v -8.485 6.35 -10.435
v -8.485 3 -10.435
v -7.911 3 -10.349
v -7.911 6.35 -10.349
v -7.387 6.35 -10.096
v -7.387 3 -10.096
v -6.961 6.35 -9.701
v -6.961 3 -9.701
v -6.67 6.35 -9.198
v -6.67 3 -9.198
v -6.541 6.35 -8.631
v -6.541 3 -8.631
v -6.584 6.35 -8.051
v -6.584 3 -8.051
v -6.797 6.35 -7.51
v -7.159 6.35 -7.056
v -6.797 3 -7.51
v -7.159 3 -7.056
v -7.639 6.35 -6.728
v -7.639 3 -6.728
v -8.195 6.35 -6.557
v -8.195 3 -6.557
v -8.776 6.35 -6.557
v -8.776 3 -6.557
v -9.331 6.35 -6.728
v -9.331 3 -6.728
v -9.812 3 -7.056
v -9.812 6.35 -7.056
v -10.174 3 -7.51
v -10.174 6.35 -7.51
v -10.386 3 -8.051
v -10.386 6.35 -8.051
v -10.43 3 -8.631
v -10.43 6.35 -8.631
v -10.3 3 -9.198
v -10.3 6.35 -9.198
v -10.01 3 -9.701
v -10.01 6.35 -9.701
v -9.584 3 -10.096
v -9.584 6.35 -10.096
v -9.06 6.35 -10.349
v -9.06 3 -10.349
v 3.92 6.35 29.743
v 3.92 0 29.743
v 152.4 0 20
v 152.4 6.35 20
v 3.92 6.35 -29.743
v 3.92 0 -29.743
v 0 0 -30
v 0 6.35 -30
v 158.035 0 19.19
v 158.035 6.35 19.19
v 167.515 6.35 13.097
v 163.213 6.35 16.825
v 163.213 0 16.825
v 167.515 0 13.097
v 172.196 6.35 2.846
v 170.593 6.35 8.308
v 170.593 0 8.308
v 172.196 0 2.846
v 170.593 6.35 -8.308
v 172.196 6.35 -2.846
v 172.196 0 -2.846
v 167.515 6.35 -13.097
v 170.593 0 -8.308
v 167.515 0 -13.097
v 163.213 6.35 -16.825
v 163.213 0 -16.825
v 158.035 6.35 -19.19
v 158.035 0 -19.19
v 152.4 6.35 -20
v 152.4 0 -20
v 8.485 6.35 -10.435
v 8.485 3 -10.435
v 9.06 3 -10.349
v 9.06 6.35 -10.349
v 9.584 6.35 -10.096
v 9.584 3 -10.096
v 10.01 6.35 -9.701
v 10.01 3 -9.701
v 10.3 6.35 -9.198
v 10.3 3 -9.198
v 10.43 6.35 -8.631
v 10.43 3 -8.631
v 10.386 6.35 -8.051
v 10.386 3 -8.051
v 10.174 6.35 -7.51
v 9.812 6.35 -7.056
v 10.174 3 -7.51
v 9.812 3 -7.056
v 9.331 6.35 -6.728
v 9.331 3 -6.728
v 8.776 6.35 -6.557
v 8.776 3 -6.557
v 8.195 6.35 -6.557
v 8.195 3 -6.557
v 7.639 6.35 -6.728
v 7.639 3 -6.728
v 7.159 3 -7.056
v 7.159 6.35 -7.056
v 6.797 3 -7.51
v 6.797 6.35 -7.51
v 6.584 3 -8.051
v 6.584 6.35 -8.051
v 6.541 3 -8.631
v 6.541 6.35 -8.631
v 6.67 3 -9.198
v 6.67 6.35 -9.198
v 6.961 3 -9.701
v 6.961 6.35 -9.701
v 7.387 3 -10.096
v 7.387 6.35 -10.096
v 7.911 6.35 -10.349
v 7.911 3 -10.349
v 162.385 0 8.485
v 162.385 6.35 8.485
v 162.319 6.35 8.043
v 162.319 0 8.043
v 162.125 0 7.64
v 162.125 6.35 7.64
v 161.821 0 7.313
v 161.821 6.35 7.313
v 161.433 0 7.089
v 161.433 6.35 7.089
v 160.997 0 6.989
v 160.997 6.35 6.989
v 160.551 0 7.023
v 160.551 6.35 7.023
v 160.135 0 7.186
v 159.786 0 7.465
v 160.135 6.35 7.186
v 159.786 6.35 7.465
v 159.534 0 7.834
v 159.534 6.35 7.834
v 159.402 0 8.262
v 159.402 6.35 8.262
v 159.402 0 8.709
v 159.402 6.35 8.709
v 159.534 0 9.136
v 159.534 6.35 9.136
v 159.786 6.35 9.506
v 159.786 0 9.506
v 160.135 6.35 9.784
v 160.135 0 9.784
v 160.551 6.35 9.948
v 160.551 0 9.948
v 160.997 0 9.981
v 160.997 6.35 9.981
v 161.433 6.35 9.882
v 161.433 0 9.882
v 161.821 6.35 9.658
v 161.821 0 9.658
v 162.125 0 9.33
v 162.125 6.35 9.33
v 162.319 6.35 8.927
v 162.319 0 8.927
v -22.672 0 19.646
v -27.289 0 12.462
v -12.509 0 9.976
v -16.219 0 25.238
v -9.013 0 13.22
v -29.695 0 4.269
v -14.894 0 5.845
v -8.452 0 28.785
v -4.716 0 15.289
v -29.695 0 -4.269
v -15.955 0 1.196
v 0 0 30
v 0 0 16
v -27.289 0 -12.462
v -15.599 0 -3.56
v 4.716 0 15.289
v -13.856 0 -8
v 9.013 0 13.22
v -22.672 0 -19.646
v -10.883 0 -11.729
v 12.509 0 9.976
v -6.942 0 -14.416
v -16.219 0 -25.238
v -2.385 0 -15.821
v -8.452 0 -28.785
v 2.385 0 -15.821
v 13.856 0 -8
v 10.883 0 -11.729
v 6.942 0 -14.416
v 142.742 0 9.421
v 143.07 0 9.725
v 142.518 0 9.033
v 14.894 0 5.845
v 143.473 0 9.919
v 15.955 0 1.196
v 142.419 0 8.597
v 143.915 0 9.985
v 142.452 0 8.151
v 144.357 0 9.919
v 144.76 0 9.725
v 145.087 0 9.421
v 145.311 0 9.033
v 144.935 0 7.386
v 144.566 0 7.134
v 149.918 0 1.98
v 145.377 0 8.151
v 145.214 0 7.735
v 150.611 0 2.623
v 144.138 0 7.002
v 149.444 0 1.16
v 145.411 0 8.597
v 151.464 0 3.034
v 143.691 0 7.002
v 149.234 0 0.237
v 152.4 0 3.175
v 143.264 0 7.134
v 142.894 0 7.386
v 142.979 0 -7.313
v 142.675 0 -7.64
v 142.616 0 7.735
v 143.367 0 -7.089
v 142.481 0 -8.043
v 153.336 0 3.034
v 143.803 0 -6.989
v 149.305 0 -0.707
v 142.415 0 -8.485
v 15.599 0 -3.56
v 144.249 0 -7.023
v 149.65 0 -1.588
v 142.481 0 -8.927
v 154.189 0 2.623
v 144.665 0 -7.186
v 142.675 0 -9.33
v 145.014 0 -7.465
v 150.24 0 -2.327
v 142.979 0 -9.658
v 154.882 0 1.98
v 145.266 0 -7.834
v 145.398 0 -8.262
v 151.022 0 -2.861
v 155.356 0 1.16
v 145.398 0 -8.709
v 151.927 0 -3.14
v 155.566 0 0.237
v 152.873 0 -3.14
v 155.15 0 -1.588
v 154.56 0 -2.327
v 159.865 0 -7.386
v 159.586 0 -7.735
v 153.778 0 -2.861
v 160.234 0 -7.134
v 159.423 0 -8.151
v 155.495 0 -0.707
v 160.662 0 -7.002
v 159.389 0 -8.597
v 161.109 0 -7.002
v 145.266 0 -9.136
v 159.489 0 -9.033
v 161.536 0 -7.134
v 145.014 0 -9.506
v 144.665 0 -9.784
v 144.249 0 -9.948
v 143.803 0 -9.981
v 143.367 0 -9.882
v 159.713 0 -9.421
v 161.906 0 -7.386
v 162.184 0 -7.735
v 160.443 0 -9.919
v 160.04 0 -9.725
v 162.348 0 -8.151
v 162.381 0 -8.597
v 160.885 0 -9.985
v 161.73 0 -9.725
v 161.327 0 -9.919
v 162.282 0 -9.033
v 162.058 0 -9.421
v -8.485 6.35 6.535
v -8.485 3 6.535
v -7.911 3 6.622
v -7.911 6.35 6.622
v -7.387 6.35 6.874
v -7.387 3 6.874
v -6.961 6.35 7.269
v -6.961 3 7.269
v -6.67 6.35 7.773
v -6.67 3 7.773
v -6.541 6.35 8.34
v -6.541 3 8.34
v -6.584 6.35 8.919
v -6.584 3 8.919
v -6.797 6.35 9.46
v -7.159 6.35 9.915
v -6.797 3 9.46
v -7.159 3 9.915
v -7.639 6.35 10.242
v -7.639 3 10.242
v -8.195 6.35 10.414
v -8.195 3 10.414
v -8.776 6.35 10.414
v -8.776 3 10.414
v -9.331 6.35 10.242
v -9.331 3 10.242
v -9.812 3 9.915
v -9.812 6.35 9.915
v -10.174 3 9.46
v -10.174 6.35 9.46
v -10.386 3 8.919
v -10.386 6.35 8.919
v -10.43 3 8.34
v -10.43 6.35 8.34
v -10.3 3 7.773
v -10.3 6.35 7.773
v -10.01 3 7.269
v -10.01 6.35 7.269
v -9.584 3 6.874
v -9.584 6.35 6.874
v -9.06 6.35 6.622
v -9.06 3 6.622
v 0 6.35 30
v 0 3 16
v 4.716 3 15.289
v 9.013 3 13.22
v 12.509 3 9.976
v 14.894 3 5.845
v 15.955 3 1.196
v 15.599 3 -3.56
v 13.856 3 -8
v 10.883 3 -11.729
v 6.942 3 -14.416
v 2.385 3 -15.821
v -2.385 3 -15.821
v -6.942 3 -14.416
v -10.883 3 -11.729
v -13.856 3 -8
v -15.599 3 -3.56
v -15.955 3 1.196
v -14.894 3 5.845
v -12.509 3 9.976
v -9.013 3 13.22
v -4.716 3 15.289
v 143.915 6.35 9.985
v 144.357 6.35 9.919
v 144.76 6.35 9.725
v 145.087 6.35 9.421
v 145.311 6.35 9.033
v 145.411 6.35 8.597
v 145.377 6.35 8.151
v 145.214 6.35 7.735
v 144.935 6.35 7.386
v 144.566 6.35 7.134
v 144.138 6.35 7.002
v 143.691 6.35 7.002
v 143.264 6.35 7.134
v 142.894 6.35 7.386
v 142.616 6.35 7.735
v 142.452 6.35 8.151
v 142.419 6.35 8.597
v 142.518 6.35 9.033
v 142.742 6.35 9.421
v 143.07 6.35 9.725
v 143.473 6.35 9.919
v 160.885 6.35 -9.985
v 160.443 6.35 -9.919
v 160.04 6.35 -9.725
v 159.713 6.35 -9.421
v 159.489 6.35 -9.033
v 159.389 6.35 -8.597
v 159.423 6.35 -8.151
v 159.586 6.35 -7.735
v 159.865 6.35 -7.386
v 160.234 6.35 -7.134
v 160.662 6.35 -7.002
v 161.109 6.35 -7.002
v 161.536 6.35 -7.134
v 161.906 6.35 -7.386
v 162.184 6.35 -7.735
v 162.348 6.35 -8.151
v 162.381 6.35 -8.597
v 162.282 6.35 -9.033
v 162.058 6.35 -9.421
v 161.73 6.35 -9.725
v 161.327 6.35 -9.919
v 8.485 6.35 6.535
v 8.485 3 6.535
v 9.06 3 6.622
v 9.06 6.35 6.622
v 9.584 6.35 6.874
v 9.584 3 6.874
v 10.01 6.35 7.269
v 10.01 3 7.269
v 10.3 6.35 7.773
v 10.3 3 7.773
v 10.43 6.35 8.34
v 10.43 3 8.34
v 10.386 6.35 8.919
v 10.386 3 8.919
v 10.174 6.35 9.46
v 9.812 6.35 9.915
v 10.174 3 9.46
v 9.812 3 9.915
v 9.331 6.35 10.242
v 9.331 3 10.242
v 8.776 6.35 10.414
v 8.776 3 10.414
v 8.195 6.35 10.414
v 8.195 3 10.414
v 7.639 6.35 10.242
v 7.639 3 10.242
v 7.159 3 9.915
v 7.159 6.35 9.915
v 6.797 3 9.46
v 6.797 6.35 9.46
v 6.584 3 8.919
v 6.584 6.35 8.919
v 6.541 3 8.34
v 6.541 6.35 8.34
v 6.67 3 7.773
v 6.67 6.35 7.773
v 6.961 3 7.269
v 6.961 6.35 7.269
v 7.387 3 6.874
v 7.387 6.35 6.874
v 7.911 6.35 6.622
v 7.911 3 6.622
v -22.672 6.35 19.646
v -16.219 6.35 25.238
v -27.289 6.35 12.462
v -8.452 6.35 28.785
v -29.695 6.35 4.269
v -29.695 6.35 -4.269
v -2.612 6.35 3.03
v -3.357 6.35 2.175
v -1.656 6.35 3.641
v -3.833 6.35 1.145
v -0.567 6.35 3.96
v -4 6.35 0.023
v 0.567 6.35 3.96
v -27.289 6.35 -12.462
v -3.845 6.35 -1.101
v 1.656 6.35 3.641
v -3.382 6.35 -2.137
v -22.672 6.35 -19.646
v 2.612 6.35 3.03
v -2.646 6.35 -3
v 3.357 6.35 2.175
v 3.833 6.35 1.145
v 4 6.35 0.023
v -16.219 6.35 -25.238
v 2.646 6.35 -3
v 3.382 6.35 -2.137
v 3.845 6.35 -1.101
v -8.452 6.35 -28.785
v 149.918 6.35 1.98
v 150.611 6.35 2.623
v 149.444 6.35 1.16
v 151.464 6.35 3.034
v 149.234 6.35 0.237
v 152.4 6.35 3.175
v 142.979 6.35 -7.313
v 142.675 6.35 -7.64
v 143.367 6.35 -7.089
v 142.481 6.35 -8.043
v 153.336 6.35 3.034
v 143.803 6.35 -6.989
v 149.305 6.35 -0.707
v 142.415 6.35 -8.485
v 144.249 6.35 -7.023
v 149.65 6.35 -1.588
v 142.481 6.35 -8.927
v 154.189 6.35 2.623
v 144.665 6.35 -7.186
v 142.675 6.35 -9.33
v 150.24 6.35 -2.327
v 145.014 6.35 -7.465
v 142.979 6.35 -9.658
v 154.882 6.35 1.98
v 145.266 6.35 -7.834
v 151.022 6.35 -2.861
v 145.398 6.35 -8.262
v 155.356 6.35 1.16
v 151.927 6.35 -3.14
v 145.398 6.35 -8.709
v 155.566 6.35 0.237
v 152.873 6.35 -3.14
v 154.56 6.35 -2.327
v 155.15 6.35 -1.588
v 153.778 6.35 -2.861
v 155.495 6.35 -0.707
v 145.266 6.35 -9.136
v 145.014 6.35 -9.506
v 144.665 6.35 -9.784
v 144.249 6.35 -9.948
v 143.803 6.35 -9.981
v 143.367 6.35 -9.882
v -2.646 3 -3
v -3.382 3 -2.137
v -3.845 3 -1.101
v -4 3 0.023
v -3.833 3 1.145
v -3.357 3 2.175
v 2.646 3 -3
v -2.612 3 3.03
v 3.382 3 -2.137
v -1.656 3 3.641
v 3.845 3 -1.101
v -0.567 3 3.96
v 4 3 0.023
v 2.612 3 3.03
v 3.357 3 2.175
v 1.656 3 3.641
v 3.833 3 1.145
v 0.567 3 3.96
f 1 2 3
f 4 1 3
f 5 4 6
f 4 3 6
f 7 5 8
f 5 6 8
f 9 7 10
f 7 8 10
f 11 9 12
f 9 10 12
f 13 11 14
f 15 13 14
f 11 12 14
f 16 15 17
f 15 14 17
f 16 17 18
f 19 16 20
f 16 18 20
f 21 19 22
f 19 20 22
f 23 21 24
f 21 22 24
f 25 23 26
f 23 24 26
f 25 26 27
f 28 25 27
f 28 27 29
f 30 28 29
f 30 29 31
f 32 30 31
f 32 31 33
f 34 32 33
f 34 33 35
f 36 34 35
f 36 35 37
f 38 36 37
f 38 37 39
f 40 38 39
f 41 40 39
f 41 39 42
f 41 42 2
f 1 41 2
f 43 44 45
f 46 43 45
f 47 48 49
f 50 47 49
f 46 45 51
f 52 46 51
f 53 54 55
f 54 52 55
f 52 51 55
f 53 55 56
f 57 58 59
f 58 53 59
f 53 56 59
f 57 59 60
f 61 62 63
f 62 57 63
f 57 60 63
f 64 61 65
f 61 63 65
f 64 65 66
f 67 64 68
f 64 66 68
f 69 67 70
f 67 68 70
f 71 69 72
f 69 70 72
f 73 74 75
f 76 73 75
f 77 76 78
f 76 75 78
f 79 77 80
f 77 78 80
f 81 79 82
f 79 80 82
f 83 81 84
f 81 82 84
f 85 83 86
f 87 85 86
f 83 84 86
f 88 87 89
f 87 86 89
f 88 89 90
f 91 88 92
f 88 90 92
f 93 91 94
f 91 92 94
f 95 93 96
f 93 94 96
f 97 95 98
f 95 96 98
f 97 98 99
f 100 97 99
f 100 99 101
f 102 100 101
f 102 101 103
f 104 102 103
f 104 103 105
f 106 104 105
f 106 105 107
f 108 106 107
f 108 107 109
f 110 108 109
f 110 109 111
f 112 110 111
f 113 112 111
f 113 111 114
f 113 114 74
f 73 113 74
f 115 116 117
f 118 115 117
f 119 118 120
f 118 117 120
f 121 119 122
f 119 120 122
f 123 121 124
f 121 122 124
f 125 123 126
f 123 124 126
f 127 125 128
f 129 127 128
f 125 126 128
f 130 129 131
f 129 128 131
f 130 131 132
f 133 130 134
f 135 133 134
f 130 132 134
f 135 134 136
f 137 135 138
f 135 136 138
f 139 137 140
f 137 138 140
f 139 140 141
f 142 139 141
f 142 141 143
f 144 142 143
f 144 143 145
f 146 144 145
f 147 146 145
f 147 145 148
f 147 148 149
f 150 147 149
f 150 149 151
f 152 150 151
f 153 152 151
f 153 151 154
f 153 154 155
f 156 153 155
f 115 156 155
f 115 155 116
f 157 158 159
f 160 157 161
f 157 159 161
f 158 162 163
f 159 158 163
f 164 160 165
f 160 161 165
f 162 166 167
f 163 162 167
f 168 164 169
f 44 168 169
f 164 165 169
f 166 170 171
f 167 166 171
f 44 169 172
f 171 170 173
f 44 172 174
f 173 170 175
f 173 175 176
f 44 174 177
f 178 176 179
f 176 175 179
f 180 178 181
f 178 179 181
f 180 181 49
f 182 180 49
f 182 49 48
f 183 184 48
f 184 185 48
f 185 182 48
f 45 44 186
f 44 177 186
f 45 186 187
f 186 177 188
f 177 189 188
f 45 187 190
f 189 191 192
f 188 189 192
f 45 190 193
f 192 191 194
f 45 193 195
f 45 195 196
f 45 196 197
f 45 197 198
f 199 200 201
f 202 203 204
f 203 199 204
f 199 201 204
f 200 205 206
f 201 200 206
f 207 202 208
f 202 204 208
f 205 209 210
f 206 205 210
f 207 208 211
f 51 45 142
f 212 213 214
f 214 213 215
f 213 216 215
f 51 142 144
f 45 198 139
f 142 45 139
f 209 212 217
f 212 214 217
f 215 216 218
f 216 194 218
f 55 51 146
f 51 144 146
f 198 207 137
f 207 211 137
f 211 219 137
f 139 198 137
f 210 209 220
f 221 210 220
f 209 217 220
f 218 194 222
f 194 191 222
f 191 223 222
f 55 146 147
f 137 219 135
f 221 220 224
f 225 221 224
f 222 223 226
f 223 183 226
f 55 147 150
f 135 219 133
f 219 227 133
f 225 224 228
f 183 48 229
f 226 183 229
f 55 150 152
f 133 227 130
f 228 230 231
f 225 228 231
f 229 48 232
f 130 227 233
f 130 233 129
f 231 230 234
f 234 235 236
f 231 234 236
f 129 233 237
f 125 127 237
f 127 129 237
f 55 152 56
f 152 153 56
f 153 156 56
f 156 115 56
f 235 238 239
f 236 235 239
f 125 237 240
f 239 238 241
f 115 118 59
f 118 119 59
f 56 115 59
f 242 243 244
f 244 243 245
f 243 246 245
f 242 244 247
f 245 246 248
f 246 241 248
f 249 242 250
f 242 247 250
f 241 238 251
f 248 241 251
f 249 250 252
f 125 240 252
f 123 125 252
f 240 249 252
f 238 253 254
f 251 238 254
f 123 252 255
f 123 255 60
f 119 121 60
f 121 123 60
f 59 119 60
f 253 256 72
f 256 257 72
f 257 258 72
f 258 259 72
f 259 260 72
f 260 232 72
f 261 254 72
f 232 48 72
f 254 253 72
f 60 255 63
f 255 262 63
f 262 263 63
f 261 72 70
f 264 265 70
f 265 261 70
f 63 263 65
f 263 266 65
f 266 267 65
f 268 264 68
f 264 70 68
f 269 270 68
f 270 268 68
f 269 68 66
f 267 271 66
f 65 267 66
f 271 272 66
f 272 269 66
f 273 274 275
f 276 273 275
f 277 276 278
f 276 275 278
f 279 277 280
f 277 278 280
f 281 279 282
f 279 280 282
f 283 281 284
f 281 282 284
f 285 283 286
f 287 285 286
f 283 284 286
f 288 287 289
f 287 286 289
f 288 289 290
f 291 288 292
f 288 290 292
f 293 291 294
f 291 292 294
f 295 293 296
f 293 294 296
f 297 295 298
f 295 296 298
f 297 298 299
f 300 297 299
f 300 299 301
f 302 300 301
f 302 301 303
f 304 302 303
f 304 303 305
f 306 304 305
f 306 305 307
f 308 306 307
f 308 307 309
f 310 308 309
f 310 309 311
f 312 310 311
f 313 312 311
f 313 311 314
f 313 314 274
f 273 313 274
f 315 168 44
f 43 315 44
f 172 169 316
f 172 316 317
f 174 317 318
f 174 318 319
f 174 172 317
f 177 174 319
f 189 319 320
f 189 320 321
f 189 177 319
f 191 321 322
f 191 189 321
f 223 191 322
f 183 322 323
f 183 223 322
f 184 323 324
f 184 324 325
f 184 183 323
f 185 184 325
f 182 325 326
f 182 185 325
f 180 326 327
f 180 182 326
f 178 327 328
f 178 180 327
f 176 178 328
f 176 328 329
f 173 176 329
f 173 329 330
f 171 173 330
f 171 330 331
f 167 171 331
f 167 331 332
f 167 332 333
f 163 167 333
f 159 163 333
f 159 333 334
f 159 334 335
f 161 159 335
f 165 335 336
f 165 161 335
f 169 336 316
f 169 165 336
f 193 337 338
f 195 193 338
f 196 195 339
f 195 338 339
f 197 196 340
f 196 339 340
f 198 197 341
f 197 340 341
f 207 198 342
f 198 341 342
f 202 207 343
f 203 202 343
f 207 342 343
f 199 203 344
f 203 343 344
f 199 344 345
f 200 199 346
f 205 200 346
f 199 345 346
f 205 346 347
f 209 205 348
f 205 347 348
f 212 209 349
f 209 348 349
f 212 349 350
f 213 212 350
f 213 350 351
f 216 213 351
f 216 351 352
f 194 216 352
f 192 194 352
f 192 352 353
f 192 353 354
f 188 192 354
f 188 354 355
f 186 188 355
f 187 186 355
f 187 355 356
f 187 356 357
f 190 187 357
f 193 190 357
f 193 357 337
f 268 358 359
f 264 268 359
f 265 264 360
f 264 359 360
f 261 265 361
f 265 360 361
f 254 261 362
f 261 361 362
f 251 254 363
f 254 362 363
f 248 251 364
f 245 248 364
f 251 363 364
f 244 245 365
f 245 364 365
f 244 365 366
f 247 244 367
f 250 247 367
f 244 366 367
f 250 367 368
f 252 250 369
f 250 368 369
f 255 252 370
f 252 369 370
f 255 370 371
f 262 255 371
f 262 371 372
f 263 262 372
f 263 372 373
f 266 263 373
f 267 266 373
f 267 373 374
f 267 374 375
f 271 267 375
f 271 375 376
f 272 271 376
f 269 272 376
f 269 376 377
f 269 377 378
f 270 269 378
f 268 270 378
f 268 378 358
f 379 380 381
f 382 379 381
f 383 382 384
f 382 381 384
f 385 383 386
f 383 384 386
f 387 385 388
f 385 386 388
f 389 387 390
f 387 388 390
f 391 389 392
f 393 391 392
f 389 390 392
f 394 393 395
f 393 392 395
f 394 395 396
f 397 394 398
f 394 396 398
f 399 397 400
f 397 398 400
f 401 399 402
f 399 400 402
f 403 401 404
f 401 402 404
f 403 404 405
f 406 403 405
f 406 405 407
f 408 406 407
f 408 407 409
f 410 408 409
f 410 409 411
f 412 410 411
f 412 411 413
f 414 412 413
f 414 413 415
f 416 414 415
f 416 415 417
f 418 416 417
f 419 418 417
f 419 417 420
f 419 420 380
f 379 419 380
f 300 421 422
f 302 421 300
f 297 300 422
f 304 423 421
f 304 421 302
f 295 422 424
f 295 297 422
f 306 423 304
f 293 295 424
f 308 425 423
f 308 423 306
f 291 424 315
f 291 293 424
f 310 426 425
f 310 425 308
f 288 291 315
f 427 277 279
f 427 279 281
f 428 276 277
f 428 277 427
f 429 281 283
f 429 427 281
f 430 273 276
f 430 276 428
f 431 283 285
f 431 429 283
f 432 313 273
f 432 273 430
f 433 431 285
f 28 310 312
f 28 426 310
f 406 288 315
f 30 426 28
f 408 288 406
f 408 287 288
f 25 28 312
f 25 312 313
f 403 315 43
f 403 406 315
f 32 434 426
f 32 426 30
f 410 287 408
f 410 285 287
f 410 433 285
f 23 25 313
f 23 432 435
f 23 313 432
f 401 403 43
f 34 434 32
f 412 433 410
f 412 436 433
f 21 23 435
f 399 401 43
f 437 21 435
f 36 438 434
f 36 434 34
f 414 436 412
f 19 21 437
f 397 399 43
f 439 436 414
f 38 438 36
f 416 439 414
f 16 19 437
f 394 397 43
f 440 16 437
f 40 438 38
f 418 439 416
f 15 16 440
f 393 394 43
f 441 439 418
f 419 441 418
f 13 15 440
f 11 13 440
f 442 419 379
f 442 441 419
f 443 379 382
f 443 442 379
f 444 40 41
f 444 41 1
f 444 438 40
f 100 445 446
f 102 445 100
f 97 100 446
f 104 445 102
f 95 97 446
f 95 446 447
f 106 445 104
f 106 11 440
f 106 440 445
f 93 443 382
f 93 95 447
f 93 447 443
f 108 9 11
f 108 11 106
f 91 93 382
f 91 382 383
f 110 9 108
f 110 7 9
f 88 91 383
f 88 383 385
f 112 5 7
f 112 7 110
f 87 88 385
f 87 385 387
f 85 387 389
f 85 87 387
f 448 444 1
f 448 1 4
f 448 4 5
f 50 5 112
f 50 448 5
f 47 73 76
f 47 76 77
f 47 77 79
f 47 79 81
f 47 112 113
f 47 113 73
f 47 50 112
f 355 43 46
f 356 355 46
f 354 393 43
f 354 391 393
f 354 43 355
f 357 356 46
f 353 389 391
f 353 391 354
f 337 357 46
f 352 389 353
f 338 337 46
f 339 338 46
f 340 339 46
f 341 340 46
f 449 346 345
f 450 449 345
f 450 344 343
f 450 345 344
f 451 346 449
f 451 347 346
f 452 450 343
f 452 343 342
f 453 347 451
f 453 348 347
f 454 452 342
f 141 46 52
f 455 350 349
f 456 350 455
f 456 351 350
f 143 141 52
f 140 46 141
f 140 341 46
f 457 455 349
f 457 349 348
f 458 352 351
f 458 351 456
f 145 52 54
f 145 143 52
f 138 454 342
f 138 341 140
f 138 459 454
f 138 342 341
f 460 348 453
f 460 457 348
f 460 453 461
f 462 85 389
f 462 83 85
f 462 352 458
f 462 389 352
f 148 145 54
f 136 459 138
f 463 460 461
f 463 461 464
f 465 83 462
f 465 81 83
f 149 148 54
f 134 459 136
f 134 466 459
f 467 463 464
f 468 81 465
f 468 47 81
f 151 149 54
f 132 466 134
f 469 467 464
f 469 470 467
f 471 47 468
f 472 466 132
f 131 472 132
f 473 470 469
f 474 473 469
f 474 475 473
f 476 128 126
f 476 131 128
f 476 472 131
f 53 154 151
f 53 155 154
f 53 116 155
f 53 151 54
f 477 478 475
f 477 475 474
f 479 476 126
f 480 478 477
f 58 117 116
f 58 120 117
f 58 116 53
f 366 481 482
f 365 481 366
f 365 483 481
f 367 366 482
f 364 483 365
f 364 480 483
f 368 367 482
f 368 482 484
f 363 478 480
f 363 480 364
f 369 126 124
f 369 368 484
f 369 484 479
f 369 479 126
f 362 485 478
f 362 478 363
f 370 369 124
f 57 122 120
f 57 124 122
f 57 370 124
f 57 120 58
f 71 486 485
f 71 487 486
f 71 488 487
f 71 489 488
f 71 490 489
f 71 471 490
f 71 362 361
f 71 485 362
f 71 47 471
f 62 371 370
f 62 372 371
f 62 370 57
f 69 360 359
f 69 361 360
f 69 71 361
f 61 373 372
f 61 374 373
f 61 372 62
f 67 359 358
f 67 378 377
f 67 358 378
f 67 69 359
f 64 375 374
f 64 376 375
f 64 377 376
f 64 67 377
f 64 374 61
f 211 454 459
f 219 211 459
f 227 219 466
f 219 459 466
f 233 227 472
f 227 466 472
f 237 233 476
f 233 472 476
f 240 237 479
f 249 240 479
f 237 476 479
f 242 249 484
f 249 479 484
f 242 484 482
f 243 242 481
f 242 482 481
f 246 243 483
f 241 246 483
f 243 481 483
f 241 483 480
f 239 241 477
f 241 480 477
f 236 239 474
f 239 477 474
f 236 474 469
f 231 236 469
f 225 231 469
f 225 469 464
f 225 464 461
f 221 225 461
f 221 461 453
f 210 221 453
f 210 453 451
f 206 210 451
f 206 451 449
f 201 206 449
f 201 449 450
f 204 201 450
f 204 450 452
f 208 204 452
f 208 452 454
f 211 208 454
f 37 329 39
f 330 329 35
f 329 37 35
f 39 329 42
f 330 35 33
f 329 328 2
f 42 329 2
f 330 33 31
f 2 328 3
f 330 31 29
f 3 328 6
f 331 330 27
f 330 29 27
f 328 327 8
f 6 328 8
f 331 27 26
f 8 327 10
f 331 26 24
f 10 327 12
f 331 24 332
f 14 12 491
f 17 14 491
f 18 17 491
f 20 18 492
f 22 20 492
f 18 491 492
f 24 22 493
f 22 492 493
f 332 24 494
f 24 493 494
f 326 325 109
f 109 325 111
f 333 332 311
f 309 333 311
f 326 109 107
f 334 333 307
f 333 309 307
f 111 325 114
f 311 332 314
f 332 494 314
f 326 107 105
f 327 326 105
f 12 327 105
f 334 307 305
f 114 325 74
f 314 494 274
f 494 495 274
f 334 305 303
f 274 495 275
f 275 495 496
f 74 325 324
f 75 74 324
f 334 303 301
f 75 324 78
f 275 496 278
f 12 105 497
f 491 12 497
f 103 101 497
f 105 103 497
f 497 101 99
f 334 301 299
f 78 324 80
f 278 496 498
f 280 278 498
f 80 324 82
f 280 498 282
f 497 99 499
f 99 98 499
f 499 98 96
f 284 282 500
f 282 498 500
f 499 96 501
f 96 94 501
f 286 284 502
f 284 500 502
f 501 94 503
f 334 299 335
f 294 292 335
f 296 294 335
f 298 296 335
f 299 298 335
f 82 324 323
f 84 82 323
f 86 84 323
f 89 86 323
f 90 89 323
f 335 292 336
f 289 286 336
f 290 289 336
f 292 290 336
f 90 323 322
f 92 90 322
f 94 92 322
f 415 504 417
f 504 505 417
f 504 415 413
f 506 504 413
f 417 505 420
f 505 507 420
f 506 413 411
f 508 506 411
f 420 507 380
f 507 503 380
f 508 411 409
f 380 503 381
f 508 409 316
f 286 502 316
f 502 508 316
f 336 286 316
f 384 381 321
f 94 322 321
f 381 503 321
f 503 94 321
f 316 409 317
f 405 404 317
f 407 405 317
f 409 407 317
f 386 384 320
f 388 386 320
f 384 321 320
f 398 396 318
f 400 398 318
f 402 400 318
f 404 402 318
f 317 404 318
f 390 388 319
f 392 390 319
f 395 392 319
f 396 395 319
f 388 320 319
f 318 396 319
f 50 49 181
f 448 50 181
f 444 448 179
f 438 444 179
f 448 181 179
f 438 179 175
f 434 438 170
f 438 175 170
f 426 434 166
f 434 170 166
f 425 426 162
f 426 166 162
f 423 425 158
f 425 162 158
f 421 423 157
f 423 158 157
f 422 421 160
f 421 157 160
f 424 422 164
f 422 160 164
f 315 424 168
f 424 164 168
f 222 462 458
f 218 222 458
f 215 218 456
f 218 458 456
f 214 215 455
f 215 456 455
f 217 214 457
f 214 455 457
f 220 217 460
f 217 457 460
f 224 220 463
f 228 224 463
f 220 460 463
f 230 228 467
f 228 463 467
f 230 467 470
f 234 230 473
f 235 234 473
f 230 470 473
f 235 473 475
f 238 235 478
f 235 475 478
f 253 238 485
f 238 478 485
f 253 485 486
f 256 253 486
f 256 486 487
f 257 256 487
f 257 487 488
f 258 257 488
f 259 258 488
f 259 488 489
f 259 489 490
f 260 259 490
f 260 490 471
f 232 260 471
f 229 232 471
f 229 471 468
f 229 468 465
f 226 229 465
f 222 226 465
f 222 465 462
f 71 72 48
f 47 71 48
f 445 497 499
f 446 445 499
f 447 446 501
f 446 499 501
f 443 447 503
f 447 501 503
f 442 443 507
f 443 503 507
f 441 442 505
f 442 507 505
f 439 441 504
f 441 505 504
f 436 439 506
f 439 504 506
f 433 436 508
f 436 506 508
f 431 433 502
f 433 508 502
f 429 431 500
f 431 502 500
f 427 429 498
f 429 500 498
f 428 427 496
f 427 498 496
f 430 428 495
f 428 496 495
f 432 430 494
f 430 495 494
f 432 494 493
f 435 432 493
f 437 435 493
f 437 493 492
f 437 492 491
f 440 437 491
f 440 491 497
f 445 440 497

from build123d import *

# Parameters (mm, degrees)
SKETCH2_R             = 20
BOSS_EXTRUDE1_DEPTH   = 6.35
SKETCH11_R            = 3.175
CUT_EXTRUDE1_DEPTH    = 10
CUT_EXTRUDE2_START    = -6.35
SKETCH12_R            = 16
CUT_EXTRUDE2_DEPTH    = 3
SKETCH13_R            = 1.95
CUT_EXTRUDE3_DEPTH    = 176.022805657
F_3_0MM_DOWEL_HOLE1_D = 3
CIRPATTERN1_COUNT     = 4


with BuildPart() as part:
    # Sketch2 → Boss-Extrude1 (new body)
    # profile 1 of 3: a face of its own
    with BuildSketch(Plane(origin=(0, 0, 0), x_dir=(1, 0, 0), z_dir=(0, 1, 0))):
        with BuildLine():
            Line((152.4, 20), (3.920129505, 29.742773655))
            ThreePointArc((3.920129505, 29.742773655), (22.556638548, 19.778727397), (30, 0))
            ThreePointArc((30, 0), (22.556638548, -19.778727397), (3.920129505, -29.742773655))
            Line((3.920129505, -29.742773655), (152.4, -20))
            ThreePointArc((152.4, -20), (132.4, 0), (152.4, 20))
        make_face()
    # profile 2 of 3: a face of its own
    with BuildSketch(Plane(origin=(0, 0, 0), x_dir=(1, 0, 0), z_dir=(0, 1, 0))):
        with BuildLine():
            Line((3.920129505, 29.742773655), (0, 30))
            ThreePointArc((0, 30), (-30, 0), (0, -30))
            Line((0, -30), (3.920129505, -29.742773655))
            ThreePointArc((3.920129505, -29.742773655), (22.556638548, -19.778727397), (30, 0))
            ThreePointArc((30, 0), (22.556638548, 19.778727397), (3.920129505, 29.742773655))
        make_face()
        with BuildLine():
            ThreePointArc((2.645751311, 3), (0, -4), (-2.645751311, 3))
            Line((-2.645751311, 3), (2.645751311, 3))
        make_face(mode=Mode.SUBTRACT)
    # profile 3 of 3: a face of its own
    with BuildSketch(Plane(origin=(0, 0, 0), x_dir=(1, 0, 0), z_dir=(0, 1, 0))):
        with Locations((152.4, 0)):
            Circle(SKETCH2_R)
    extrude(amount=BOSS_EXTRUDE1_DEPTH)

    # Sketch11 → Cut-Extrude1 (cut)
    with BuildSketch(Plane(origin=(0, 6.35, 0), x_dir=(1, 0, 0), z_dir=(0, 1, 0))):
        with Locations(Location((152.4, 0, 0), (0, 0, 270))):
            Circle(SKETCH11_R)
    extrude(amount=-CUT_EXTRUDE1_DEPTH, mode=Mode.SUBTRACT)

    # Sketch12 → Cut-Extrude2 (cut)
    with BuildSketch(Plane(origin=(0, 6.35, 0), x_dir=(1, 0, 0), z_dir=(0, 1, 0)).offset(CUT_EXTRUDE2_START)):
        with Locations(Location((0, 0, 0), (0, 0, 270))):
            Circle(SKETCH12_R)
    extrude(amount=CUT_EXTRUDE2_DEPTH, mode=Mode.SUBTRACT)

    # Sketch13 → Cut-Extrude3 (cut, through all)
    with BuildSketch(Plane(origin=(0, 3, 0), x_dir=(-1, 0, 0), z_dir=(0, -1, 0))):
        with Locations(Location((-8.485281374, 8.485281374, 0), (0, 0, 90))):
            Circle(SKETCH13_R)
        with Locations(Location((8.485281374, 8.485281374, 0), (0, 0, 90))):
            Circle(SKETCH13_R)
        with Locations(Location((8.485281374, -8.485281374, 0), (0, 0, 90))):
            Circle(SKETCH13_R)
        with Locations(Location((-8.485281374, -8.485281374, 0), (0, 0, 90))):
            Circle(SKETCH13_R)
    extrude(amount=-CUT_EXTRUDE3_DEPTH, mode=Mode.SUBTRACT)

    # Ø3.0mm Dowel Hole1 (through all)
    with Locations(Plane(origin=(0, 0, 0), x_dir=(-1, 0, 0), z_dir=(0, -1, 0))):
        with Locations((-160.885281374, -8.485281374)):
            f_3_0mm_dowel_hole1 = Hole(F_3_0MM_DOWEL_HOLE1_D / 2)

    # CirPattern1: Ø3.0mm Dowel Hole1 ×4 about axis
    cirpattern1_axis = Axis((152.4, 0, 0), (0, 1, 0))
    for i in range(1, CIRPATTERN1_COUNT):
        add(f_3_0mm_dowel_hole1.rotate(cirpattern1_axis, i * 360 / CIRPATTERN1_COUNT), mode=Mode.SUBTRACT)


solid = part.part
